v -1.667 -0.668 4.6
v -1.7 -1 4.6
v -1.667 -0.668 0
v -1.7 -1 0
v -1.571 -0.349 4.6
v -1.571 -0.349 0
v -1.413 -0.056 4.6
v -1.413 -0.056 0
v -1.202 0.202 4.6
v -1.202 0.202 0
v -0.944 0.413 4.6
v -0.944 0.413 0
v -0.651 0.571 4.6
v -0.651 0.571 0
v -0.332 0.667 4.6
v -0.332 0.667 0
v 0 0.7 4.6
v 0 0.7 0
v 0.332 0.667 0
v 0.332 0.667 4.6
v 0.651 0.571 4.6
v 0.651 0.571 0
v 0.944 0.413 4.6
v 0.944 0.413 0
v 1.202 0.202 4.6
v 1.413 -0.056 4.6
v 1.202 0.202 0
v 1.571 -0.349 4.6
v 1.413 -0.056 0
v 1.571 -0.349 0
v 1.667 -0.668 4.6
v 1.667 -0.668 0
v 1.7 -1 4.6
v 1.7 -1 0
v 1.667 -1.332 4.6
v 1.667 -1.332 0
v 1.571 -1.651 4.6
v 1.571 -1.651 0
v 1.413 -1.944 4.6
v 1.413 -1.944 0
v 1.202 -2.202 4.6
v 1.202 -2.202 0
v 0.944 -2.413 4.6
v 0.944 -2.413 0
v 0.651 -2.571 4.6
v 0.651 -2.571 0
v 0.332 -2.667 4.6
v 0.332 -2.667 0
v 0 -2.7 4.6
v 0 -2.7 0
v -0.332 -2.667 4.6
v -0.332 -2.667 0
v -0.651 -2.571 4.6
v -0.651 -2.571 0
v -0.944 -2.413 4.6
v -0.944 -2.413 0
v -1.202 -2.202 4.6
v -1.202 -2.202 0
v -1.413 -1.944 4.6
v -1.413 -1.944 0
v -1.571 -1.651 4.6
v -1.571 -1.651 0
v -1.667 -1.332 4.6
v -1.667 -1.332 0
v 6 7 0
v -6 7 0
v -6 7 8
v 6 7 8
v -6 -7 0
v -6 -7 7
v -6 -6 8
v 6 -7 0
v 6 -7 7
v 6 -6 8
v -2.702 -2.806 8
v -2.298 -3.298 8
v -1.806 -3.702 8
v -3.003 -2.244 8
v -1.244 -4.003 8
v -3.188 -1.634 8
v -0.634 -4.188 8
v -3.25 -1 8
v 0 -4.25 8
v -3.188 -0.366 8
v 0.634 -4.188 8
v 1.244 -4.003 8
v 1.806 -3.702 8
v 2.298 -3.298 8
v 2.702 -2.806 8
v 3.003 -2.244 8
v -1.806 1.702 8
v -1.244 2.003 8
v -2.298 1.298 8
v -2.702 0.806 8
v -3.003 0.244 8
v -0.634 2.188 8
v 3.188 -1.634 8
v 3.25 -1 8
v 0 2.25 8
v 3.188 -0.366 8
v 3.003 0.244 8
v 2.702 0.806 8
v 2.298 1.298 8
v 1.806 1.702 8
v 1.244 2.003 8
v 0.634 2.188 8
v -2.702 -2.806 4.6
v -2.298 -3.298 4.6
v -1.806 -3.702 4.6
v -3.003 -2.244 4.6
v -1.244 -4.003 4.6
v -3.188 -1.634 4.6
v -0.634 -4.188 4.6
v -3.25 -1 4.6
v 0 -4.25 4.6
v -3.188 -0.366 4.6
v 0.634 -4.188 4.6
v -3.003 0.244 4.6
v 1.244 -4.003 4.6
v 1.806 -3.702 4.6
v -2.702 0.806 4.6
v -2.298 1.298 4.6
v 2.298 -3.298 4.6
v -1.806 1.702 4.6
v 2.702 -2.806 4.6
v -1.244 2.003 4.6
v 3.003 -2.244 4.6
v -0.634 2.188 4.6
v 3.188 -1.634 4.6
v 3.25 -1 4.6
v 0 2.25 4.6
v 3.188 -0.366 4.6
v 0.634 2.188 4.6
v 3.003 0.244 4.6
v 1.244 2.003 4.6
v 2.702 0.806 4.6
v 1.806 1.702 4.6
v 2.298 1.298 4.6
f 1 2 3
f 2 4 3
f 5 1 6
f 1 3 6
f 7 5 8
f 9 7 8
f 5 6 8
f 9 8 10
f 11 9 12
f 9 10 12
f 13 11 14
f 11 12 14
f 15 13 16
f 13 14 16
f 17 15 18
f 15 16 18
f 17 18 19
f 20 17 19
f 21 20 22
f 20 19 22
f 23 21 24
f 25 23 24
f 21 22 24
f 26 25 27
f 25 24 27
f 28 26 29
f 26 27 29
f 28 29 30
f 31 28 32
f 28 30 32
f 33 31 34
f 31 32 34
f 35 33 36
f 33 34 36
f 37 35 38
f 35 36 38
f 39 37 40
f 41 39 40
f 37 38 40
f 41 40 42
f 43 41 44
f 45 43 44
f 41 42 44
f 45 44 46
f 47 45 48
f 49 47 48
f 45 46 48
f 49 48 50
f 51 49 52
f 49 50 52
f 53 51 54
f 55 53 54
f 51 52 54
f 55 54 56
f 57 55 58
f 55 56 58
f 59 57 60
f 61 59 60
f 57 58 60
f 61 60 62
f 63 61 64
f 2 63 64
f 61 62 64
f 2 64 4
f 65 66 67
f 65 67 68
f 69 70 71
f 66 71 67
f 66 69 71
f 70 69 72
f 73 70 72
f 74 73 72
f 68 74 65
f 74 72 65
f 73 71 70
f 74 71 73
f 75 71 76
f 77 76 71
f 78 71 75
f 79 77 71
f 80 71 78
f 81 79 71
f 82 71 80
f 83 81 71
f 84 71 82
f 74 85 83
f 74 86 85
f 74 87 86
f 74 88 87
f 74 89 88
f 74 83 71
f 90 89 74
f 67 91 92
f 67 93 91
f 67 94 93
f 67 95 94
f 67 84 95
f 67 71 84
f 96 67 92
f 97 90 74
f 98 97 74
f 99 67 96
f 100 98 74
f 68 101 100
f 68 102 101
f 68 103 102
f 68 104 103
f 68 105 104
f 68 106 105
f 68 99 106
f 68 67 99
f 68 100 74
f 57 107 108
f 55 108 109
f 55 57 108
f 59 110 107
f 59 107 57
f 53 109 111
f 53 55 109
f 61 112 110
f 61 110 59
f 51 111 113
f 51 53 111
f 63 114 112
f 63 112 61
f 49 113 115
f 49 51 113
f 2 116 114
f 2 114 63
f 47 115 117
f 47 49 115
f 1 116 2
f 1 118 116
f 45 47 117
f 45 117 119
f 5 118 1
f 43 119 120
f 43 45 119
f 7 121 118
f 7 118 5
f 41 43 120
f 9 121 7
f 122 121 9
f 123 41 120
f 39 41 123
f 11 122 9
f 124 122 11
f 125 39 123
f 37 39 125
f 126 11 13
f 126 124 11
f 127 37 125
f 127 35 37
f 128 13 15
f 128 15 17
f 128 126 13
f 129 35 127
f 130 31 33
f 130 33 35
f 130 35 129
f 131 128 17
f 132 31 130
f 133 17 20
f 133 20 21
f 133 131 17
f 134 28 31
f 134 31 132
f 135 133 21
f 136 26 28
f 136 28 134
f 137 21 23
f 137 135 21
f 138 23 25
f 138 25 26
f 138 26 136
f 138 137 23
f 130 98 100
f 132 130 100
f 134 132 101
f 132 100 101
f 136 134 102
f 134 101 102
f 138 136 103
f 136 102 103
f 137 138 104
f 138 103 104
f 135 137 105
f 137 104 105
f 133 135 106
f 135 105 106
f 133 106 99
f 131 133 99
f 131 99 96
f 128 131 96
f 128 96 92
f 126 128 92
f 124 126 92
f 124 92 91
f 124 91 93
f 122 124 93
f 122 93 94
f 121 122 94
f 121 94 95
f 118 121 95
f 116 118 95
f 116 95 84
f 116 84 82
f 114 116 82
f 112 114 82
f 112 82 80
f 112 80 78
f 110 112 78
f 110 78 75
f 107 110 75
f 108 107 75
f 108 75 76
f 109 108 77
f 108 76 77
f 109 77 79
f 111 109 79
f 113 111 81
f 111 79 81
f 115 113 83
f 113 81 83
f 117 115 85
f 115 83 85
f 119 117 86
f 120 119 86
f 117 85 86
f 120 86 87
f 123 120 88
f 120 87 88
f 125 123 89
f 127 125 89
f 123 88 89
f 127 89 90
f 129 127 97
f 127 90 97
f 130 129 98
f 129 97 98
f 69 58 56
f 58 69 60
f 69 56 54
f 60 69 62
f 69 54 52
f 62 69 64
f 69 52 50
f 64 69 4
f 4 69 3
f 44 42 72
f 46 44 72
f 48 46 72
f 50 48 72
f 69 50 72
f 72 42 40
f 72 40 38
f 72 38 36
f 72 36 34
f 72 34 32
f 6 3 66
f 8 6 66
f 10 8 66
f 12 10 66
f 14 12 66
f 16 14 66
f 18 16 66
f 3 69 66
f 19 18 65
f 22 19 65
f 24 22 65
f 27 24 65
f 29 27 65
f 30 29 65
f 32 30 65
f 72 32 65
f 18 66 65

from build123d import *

# Parameters (mm, degrees)
F0_W           = 12
F0_H           = 14
F1_DEPTH       = 8
F2_SIZE        = 1
F4_D           = 3.4
F4_DEPTH       = 10
F4_CBORE_D     = 6.5
F4_CBORE_DEPTH = 3.4


with BuildPart() as f1:
    # F0 (on Top) → F1 (new body)
    with BuildSketch(Plane.XY):
        Rectangle(F0_W, F0_H)
    extrude(amount=F1_DEPTH)

    # F2
    f2_edges = [f1.edges().sort_by_distance(p)[0] for p in [
        (0, -7, 8),
    ]]
    chamfer(f2_edges, length=F2_SIZE)

    # F4
    with Locations(Plane.XY.offset(8)):
        with Locations((0, -1)):
            CounterBoreHole(F4_D / 2, F4_CBORE_D / 2, F4_CBORE_DEPTH, depth=F4_DEPTH)


solid = f1.part
